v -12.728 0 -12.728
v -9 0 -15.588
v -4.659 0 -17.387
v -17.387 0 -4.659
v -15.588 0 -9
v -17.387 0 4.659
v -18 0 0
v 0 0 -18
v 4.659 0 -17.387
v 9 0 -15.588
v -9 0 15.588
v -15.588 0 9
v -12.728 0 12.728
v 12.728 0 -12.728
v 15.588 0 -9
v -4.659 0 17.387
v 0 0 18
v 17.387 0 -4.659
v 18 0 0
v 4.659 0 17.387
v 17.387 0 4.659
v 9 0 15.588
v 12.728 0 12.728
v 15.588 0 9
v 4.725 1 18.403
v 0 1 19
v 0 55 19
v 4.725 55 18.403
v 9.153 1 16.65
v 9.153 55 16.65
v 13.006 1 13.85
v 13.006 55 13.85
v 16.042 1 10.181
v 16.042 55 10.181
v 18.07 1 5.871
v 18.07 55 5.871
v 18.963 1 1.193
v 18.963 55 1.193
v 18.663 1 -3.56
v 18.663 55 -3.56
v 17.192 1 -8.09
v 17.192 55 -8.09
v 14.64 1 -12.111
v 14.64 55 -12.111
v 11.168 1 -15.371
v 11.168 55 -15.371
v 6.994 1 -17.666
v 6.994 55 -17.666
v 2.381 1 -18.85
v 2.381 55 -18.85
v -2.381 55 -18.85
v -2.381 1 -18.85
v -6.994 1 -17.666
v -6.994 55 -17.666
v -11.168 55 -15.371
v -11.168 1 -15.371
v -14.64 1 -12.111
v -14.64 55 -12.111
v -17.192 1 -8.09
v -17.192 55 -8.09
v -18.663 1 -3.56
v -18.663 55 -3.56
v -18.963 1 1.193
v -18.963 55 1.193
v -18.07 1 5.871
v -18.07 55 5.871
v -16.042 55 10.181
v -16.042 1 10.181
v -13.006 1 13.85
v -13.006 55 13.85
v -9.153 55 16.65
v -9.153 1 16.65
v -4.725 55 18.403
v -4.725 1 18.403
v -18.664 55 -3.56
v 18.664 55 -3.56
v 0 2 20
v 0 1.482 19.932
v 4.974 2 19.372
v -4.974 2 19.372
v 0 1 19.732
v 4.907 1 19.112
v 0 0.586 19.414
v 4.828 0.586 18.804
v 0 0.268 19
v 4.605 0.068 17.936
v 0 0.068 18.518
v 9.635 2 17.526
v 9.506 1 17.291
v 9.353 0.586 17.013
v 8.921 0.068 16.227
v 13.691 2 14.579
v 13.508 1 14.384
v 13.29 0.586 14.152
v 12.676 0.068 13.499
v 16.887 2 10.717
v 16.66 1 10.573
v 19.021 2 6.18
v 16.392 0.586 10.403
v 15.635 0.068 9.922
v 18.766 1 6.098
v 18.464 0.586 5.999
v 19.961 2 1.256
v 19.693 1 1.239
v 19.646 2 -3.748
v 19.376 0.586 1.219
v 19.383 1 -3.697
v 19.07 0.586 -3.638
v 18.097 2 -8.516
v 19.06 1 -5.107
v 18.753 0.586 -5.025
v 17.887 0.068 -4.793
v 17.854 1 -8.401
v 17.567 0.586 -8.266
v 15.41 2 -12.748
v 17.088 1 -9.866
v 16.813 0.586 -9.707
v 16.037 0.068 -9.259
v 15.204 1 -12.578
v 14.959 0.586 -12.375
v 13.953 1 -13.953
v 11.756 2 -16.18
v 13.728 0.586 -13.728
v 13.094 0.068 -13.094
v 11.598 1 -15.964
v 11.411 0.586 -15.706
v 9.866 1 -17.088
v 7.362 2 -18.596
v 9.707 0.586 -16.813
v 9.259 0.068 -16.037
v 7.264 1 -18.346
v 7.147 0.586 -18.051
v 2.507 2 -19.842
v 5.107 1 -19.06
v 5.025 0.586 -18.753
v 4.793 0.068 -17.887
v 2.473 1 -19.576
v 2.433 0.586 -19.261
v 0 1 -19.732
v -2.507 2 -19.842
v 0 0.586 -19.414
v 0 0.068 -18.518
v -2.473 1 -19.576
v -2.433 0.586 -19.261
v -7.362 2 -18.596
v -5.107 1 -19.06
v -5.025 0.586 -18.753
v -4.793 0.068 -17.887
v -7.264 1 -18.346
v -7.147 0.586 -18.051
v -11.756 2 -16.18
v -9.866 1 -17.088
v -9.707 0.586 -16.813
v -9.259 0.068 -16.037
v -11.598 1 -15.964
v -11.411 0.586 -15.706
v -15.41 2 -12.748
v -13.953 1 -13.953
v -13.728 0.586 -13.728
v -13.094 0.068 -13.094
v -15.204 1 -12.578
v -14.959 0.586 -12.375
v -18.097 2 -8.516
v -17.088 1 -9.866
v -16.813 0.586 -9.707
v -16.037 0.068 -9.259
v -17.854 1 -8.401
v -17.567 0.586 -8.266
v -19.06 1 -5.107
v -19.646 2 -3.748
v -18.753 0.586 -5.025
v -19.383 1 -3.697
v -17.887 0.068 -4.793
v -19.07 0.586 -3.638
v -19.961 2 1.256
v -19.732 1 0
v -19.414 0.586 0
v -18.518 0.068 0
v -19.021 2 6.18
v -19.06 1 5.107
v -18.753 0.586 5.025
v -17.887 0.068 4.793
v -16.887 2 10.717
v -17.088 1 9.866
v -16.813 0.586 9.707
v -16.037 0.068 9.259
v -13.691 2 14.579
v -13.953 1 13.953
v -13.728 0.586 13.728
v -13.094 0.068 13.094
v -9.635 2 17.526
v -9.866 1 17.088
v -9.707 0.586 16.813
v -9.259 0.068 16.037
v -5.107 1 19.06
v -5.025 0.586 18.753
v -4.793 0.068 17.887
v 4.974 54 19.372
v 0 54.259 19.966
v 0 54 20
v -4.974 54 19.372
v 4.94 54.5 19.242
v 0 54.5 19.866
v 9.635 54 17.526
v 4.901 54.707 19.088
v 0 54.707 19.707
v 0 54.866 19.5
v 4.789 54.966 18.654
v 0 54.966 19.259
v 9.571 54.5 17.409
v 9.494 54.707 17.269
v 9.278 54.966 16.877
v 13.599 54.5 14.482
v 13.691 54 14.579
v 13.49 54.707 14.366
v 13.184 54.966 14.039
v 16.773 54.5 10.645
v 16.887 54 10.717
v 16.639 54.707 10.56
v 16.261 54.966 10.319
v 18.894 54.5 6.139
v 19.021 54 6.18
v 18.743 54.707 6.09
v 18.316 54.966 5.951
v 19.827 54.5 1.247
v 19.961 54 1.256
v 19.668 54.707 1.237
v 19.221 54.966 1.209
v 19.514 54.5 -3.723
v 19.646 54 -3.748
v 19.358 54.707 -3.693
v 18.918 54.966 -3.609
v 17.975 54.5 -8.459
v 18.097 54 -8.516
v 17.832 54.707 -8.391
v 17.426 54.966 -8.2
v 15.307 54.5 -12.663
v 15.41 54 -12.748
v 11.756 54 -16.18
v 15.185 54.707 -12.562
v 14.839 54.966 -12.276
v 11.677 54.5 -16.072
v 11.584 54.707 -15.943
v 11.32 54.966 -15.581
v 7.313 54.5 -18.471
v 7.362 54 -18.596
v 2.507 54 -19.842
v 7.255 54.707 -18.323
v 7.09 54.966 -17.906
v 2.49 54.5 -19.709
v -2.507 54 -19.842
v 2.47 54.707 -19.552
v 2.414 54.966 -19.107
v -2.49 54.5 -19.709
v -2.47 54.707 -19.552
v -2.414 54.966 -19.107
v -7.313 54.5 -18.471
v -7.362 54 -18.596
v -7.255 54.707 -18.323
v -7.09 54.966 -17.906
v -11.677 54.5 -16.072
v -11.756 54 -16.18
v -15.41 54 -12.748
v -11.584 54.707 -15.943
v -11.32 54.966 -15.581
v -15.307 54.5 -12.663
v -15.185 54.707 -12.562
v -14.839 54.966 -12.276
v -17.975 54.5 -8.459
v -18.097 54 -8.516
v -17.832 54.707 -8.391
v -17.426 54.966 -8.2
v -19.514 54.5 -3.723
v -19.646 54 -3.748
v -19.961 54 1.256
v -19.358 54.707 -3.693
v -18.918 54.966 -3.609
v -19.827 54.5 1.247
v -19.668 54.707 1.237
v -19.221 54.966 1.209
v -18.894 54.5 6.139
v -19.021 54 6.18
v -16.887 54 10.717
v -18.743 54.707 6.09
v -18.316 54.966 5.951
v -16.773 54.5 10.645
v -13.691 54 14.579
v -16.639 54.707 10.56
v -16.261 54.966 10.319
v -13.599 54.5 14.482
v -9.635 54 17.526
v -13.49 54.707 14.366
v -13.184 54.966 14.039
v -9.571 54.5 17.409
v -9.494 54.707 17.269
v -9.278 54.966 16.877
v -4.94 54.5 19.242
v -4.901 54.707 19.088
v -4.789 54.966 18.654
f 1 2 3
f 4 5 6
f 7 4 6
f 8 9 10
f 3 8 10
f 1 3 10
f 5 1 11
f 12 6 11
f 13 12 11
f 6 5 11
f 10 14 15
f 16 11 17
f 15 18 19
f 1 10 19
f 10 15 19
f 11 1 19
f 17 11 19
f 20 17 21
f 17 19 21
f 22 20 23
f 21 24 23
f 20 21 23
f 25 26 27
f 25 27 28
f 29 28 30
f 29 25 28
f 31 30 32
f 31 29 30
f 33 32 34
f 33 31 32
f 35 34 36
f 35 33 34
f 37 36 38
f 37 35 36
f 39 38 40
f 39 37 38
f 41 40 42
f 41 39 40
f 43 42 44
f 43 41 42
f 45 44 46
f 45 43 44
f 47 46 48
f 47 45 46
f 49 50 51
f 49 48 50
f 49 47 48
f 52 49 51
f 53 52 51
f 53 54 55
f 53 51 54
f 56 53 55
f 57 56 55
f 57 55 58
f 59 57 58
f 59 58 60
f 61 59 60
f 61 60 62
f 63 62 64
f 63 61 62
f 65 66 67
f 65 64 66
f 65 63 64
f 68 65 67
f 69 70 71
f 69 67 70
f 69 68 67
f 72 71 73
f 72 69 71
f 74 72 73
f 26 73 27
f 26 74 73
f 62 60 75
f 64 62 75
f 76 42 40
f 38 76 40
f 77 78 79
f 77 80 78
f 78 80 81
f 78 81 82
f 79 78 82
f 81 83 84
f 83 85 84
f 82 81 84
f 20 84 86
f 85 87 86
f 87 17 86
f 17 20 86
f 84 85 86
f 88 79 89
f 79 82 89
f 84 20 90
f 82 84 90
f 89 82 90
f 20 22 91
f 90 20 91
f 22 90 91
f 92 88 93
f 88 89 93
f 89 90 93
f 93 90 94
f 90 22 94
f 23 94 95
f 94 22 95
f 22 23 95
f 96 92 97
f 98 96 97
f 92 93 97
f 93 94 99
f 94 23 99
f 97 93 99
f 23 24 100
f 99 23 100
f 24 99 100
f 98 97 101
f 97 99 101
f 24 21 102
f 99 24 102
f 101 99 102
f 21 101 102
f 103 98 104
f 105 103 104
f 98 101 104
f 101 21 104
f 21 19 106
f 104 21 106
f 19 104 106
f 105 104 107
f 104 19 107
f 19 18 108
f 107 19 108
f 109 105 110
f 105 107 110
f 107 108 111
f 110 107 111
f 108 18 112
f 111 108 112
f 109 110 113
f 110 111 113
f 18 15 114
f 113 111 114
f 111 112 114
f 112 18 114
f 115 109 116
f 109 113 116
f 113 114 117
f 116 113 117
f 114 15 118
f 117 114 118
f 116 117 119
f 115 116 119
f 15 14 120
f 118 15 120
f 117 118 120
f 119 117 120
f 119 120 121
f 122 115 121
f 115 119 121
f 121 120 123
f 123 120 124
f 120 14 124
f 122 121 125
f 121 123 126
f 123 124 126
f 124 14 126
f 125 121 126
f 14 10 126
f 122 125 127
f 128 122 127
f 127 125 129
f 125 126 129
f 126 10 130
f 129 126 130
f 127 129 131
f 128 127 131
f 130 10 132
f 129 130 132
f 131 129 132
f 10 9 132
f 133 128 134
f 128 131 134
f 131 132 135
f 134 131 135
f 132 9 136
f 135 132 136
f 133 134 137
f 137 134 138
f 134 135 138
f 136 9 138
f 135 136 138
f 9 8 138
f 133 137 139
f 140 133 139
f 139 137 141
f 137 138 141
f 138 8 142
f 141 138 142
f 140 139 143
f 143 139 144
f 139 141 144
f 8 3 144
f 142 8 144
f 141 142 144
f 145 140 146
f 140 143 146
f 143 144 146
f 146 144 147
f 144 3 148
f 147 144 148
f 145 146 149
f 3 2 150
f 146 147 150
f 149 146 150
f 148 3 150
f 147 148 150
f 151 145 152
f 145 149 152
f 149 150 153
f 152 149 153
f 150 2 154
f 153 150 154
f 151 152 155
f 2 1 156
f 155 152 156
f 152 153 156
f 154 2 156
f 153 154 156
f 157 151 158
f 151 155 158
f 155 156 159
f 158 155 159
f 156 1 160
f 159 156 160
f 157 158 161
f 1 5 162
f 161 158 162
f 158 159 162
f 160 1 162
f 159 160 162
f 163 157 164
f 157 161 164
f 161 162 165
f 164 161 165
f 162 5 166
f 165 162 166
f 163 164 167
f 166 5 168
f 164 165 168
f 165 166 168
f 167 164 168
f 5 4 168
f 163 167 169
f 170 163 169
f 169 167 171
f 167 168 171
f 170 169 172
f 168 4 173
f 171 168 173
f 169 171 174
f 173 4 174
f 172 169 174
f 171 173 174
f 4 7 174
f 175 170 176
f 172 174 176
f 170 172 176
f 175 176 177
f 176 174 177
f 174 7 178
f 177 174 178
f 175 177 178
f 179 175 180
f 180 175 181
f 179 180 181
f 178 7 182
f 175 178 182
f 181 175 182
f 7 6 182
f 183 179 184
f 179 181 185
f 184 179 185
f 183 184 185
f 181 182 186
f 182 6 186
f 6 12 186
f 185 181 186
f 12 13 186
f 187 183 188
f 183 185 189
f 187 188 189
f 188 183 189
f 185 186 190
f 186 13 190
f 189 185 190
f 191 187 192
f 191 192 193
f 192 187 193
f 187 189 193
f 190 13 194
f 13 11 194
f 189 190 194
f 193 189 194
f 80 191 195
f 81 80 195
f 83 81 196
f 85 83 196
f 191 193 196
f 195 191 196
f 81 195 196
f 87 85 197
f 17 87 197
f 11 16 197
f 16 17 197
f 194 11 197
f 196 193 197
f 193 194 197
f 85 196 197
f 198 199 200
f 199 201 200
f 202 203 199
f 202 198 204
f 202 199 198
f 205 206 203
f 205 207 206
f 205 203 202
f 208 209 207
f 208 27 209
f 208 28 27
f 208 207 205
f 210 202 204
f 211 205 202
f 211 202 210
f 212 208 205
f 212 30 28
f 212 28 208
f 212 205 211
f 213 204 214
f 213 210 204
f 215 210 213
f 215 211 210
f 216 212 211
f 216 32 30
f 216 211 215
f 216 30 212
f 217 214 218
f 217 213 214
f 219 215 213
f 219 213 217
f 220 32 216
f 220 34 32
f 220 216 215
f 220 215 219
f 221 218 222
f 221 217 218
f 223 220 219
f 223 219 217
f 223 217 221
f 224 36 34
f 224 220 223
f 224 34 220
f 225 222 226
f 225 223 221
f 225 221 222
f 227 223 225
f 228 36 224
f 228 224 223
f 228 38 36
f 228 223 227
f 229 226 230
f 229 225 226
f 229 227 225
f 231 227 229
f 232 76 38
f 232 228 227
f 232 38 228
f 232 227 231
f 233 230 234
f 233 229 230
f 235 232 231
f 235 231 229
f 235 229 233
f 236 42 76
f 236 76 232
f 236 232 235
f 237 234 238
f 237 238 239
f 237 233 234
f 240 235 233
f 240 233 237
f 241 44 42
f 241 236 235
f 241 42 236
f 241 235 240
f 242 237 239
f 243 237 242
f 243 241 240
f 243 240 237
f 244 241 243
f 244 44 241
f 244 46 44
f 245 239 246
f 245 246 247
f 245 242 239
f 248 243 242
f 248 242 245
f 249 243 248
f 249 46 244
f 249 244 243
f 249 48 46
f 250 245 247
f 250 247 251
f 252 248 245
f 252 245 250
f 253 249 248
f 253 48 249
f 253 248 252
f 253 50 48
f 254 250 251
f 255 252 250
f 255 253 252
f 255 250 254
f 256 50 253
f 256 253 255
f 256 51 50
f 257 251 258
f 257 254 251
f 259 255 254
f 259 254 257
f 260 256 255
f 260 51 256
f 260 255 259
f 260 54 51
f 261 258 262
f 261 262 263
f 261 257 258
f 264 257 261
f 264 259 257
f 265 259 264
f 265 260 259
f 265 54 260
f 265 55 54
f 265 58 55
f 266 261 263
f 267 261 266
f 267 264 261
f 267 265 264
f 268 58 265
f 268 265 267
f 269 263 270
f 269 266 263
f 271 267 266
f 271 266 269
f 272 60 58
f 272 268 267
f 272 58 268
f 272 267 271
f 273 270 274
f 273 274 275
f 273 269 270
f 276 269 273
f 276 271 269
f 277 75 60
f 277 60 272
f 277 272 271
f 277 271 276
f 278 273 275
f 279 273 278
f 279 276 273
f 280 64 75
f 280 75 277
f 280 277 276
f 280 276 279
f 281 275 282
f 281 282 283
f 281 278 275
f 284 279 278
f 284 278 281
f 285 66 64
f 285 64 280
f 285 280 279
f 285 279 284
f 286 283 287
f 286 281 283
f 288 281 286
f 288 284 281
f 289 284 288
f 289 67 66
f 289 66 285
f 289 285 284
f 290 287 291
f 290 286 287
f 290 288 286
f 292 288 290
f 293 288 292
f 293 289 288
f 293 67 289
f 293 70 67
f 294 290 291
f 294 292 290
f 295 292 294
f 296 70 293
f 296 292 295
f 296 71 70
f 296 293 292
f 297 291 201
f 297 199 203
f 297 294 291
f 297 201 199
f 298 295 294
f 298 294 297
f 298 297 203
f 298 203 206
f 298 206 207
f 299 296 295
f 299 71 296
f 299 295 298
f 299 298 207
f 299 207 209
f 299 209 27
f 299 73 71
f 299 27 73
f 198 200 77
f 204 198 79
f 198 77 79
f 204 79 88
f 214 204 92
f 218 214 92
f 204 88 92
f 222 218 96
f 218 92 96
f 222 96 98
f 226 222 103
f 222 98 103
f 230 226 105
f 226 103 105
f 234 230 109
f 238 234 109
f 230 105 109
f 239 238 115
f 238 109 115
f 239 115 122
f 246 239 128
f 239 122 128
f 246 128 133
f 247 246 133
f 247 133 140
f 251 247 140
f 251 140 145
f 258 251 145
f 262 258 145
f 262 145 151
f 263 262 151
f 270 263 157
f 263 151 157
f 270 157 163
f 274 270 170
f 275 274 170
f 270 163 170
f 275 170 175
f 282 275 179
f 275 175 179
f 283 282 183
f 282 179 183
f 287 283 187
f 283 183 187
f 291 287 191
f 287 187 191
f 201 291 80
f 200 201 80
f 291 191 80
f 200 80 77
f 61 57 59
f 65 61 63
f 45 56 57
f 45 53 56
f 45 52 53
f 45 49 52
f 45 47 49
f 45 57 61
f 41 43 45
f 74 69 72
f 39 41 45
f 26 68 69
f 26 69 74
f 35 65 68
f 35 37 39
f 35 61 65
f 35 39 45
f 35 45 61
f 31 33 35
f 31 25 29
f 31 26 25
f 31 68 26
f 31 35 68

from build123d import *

# Parameters (mm, degrees)
SKETCH1_R           = 20
BOSS_EXTRUDE1_DEPTH = 55
SHELL1_T            = -1
FILLET1_R           = 2
FILLET7_R           = 1


with BuildPart() as part:
    # Sketch1 → Boss-Extrude1 (new body)
    with BuildSketch(Plane(origin=(0, 0, 0), x_dir=(1, 0, 0), z_dir=(0, 1, 0))):
        with Locations(Location((0, 0, 0), (0, 0, 270))):
            Circle(SKETCH1_R)
    extrude(amount=BOSS_EXTRUDE1_DEPTH)

    # Shell1
    shell1_openings = [part.faces().sort_by_distance(p)[0] for p in [
        (0, 55, 0),
    ]]
    offset(amount=SHELL1_T, openings=shell1_openings, kind=Kind.INTERSECTION)

    # Fillet1
    fillet1_edges = [part.edges().sort_by_distance(p)[0] for p in [
        (0, 0, -20),
    ]]
    fillet(fillet1_edges, radius=FILLET1_R)

    # Fillet7
    fillet7_edges = [part.edges().sort_by_distance(p)[0] for p in [
        (0, 55, -20),
    ]]
    fillet(fillet7_edges, radius=FILLET7_R - 0.0001)  # a hair under: the kernel refuses the full size


solid = part.part
